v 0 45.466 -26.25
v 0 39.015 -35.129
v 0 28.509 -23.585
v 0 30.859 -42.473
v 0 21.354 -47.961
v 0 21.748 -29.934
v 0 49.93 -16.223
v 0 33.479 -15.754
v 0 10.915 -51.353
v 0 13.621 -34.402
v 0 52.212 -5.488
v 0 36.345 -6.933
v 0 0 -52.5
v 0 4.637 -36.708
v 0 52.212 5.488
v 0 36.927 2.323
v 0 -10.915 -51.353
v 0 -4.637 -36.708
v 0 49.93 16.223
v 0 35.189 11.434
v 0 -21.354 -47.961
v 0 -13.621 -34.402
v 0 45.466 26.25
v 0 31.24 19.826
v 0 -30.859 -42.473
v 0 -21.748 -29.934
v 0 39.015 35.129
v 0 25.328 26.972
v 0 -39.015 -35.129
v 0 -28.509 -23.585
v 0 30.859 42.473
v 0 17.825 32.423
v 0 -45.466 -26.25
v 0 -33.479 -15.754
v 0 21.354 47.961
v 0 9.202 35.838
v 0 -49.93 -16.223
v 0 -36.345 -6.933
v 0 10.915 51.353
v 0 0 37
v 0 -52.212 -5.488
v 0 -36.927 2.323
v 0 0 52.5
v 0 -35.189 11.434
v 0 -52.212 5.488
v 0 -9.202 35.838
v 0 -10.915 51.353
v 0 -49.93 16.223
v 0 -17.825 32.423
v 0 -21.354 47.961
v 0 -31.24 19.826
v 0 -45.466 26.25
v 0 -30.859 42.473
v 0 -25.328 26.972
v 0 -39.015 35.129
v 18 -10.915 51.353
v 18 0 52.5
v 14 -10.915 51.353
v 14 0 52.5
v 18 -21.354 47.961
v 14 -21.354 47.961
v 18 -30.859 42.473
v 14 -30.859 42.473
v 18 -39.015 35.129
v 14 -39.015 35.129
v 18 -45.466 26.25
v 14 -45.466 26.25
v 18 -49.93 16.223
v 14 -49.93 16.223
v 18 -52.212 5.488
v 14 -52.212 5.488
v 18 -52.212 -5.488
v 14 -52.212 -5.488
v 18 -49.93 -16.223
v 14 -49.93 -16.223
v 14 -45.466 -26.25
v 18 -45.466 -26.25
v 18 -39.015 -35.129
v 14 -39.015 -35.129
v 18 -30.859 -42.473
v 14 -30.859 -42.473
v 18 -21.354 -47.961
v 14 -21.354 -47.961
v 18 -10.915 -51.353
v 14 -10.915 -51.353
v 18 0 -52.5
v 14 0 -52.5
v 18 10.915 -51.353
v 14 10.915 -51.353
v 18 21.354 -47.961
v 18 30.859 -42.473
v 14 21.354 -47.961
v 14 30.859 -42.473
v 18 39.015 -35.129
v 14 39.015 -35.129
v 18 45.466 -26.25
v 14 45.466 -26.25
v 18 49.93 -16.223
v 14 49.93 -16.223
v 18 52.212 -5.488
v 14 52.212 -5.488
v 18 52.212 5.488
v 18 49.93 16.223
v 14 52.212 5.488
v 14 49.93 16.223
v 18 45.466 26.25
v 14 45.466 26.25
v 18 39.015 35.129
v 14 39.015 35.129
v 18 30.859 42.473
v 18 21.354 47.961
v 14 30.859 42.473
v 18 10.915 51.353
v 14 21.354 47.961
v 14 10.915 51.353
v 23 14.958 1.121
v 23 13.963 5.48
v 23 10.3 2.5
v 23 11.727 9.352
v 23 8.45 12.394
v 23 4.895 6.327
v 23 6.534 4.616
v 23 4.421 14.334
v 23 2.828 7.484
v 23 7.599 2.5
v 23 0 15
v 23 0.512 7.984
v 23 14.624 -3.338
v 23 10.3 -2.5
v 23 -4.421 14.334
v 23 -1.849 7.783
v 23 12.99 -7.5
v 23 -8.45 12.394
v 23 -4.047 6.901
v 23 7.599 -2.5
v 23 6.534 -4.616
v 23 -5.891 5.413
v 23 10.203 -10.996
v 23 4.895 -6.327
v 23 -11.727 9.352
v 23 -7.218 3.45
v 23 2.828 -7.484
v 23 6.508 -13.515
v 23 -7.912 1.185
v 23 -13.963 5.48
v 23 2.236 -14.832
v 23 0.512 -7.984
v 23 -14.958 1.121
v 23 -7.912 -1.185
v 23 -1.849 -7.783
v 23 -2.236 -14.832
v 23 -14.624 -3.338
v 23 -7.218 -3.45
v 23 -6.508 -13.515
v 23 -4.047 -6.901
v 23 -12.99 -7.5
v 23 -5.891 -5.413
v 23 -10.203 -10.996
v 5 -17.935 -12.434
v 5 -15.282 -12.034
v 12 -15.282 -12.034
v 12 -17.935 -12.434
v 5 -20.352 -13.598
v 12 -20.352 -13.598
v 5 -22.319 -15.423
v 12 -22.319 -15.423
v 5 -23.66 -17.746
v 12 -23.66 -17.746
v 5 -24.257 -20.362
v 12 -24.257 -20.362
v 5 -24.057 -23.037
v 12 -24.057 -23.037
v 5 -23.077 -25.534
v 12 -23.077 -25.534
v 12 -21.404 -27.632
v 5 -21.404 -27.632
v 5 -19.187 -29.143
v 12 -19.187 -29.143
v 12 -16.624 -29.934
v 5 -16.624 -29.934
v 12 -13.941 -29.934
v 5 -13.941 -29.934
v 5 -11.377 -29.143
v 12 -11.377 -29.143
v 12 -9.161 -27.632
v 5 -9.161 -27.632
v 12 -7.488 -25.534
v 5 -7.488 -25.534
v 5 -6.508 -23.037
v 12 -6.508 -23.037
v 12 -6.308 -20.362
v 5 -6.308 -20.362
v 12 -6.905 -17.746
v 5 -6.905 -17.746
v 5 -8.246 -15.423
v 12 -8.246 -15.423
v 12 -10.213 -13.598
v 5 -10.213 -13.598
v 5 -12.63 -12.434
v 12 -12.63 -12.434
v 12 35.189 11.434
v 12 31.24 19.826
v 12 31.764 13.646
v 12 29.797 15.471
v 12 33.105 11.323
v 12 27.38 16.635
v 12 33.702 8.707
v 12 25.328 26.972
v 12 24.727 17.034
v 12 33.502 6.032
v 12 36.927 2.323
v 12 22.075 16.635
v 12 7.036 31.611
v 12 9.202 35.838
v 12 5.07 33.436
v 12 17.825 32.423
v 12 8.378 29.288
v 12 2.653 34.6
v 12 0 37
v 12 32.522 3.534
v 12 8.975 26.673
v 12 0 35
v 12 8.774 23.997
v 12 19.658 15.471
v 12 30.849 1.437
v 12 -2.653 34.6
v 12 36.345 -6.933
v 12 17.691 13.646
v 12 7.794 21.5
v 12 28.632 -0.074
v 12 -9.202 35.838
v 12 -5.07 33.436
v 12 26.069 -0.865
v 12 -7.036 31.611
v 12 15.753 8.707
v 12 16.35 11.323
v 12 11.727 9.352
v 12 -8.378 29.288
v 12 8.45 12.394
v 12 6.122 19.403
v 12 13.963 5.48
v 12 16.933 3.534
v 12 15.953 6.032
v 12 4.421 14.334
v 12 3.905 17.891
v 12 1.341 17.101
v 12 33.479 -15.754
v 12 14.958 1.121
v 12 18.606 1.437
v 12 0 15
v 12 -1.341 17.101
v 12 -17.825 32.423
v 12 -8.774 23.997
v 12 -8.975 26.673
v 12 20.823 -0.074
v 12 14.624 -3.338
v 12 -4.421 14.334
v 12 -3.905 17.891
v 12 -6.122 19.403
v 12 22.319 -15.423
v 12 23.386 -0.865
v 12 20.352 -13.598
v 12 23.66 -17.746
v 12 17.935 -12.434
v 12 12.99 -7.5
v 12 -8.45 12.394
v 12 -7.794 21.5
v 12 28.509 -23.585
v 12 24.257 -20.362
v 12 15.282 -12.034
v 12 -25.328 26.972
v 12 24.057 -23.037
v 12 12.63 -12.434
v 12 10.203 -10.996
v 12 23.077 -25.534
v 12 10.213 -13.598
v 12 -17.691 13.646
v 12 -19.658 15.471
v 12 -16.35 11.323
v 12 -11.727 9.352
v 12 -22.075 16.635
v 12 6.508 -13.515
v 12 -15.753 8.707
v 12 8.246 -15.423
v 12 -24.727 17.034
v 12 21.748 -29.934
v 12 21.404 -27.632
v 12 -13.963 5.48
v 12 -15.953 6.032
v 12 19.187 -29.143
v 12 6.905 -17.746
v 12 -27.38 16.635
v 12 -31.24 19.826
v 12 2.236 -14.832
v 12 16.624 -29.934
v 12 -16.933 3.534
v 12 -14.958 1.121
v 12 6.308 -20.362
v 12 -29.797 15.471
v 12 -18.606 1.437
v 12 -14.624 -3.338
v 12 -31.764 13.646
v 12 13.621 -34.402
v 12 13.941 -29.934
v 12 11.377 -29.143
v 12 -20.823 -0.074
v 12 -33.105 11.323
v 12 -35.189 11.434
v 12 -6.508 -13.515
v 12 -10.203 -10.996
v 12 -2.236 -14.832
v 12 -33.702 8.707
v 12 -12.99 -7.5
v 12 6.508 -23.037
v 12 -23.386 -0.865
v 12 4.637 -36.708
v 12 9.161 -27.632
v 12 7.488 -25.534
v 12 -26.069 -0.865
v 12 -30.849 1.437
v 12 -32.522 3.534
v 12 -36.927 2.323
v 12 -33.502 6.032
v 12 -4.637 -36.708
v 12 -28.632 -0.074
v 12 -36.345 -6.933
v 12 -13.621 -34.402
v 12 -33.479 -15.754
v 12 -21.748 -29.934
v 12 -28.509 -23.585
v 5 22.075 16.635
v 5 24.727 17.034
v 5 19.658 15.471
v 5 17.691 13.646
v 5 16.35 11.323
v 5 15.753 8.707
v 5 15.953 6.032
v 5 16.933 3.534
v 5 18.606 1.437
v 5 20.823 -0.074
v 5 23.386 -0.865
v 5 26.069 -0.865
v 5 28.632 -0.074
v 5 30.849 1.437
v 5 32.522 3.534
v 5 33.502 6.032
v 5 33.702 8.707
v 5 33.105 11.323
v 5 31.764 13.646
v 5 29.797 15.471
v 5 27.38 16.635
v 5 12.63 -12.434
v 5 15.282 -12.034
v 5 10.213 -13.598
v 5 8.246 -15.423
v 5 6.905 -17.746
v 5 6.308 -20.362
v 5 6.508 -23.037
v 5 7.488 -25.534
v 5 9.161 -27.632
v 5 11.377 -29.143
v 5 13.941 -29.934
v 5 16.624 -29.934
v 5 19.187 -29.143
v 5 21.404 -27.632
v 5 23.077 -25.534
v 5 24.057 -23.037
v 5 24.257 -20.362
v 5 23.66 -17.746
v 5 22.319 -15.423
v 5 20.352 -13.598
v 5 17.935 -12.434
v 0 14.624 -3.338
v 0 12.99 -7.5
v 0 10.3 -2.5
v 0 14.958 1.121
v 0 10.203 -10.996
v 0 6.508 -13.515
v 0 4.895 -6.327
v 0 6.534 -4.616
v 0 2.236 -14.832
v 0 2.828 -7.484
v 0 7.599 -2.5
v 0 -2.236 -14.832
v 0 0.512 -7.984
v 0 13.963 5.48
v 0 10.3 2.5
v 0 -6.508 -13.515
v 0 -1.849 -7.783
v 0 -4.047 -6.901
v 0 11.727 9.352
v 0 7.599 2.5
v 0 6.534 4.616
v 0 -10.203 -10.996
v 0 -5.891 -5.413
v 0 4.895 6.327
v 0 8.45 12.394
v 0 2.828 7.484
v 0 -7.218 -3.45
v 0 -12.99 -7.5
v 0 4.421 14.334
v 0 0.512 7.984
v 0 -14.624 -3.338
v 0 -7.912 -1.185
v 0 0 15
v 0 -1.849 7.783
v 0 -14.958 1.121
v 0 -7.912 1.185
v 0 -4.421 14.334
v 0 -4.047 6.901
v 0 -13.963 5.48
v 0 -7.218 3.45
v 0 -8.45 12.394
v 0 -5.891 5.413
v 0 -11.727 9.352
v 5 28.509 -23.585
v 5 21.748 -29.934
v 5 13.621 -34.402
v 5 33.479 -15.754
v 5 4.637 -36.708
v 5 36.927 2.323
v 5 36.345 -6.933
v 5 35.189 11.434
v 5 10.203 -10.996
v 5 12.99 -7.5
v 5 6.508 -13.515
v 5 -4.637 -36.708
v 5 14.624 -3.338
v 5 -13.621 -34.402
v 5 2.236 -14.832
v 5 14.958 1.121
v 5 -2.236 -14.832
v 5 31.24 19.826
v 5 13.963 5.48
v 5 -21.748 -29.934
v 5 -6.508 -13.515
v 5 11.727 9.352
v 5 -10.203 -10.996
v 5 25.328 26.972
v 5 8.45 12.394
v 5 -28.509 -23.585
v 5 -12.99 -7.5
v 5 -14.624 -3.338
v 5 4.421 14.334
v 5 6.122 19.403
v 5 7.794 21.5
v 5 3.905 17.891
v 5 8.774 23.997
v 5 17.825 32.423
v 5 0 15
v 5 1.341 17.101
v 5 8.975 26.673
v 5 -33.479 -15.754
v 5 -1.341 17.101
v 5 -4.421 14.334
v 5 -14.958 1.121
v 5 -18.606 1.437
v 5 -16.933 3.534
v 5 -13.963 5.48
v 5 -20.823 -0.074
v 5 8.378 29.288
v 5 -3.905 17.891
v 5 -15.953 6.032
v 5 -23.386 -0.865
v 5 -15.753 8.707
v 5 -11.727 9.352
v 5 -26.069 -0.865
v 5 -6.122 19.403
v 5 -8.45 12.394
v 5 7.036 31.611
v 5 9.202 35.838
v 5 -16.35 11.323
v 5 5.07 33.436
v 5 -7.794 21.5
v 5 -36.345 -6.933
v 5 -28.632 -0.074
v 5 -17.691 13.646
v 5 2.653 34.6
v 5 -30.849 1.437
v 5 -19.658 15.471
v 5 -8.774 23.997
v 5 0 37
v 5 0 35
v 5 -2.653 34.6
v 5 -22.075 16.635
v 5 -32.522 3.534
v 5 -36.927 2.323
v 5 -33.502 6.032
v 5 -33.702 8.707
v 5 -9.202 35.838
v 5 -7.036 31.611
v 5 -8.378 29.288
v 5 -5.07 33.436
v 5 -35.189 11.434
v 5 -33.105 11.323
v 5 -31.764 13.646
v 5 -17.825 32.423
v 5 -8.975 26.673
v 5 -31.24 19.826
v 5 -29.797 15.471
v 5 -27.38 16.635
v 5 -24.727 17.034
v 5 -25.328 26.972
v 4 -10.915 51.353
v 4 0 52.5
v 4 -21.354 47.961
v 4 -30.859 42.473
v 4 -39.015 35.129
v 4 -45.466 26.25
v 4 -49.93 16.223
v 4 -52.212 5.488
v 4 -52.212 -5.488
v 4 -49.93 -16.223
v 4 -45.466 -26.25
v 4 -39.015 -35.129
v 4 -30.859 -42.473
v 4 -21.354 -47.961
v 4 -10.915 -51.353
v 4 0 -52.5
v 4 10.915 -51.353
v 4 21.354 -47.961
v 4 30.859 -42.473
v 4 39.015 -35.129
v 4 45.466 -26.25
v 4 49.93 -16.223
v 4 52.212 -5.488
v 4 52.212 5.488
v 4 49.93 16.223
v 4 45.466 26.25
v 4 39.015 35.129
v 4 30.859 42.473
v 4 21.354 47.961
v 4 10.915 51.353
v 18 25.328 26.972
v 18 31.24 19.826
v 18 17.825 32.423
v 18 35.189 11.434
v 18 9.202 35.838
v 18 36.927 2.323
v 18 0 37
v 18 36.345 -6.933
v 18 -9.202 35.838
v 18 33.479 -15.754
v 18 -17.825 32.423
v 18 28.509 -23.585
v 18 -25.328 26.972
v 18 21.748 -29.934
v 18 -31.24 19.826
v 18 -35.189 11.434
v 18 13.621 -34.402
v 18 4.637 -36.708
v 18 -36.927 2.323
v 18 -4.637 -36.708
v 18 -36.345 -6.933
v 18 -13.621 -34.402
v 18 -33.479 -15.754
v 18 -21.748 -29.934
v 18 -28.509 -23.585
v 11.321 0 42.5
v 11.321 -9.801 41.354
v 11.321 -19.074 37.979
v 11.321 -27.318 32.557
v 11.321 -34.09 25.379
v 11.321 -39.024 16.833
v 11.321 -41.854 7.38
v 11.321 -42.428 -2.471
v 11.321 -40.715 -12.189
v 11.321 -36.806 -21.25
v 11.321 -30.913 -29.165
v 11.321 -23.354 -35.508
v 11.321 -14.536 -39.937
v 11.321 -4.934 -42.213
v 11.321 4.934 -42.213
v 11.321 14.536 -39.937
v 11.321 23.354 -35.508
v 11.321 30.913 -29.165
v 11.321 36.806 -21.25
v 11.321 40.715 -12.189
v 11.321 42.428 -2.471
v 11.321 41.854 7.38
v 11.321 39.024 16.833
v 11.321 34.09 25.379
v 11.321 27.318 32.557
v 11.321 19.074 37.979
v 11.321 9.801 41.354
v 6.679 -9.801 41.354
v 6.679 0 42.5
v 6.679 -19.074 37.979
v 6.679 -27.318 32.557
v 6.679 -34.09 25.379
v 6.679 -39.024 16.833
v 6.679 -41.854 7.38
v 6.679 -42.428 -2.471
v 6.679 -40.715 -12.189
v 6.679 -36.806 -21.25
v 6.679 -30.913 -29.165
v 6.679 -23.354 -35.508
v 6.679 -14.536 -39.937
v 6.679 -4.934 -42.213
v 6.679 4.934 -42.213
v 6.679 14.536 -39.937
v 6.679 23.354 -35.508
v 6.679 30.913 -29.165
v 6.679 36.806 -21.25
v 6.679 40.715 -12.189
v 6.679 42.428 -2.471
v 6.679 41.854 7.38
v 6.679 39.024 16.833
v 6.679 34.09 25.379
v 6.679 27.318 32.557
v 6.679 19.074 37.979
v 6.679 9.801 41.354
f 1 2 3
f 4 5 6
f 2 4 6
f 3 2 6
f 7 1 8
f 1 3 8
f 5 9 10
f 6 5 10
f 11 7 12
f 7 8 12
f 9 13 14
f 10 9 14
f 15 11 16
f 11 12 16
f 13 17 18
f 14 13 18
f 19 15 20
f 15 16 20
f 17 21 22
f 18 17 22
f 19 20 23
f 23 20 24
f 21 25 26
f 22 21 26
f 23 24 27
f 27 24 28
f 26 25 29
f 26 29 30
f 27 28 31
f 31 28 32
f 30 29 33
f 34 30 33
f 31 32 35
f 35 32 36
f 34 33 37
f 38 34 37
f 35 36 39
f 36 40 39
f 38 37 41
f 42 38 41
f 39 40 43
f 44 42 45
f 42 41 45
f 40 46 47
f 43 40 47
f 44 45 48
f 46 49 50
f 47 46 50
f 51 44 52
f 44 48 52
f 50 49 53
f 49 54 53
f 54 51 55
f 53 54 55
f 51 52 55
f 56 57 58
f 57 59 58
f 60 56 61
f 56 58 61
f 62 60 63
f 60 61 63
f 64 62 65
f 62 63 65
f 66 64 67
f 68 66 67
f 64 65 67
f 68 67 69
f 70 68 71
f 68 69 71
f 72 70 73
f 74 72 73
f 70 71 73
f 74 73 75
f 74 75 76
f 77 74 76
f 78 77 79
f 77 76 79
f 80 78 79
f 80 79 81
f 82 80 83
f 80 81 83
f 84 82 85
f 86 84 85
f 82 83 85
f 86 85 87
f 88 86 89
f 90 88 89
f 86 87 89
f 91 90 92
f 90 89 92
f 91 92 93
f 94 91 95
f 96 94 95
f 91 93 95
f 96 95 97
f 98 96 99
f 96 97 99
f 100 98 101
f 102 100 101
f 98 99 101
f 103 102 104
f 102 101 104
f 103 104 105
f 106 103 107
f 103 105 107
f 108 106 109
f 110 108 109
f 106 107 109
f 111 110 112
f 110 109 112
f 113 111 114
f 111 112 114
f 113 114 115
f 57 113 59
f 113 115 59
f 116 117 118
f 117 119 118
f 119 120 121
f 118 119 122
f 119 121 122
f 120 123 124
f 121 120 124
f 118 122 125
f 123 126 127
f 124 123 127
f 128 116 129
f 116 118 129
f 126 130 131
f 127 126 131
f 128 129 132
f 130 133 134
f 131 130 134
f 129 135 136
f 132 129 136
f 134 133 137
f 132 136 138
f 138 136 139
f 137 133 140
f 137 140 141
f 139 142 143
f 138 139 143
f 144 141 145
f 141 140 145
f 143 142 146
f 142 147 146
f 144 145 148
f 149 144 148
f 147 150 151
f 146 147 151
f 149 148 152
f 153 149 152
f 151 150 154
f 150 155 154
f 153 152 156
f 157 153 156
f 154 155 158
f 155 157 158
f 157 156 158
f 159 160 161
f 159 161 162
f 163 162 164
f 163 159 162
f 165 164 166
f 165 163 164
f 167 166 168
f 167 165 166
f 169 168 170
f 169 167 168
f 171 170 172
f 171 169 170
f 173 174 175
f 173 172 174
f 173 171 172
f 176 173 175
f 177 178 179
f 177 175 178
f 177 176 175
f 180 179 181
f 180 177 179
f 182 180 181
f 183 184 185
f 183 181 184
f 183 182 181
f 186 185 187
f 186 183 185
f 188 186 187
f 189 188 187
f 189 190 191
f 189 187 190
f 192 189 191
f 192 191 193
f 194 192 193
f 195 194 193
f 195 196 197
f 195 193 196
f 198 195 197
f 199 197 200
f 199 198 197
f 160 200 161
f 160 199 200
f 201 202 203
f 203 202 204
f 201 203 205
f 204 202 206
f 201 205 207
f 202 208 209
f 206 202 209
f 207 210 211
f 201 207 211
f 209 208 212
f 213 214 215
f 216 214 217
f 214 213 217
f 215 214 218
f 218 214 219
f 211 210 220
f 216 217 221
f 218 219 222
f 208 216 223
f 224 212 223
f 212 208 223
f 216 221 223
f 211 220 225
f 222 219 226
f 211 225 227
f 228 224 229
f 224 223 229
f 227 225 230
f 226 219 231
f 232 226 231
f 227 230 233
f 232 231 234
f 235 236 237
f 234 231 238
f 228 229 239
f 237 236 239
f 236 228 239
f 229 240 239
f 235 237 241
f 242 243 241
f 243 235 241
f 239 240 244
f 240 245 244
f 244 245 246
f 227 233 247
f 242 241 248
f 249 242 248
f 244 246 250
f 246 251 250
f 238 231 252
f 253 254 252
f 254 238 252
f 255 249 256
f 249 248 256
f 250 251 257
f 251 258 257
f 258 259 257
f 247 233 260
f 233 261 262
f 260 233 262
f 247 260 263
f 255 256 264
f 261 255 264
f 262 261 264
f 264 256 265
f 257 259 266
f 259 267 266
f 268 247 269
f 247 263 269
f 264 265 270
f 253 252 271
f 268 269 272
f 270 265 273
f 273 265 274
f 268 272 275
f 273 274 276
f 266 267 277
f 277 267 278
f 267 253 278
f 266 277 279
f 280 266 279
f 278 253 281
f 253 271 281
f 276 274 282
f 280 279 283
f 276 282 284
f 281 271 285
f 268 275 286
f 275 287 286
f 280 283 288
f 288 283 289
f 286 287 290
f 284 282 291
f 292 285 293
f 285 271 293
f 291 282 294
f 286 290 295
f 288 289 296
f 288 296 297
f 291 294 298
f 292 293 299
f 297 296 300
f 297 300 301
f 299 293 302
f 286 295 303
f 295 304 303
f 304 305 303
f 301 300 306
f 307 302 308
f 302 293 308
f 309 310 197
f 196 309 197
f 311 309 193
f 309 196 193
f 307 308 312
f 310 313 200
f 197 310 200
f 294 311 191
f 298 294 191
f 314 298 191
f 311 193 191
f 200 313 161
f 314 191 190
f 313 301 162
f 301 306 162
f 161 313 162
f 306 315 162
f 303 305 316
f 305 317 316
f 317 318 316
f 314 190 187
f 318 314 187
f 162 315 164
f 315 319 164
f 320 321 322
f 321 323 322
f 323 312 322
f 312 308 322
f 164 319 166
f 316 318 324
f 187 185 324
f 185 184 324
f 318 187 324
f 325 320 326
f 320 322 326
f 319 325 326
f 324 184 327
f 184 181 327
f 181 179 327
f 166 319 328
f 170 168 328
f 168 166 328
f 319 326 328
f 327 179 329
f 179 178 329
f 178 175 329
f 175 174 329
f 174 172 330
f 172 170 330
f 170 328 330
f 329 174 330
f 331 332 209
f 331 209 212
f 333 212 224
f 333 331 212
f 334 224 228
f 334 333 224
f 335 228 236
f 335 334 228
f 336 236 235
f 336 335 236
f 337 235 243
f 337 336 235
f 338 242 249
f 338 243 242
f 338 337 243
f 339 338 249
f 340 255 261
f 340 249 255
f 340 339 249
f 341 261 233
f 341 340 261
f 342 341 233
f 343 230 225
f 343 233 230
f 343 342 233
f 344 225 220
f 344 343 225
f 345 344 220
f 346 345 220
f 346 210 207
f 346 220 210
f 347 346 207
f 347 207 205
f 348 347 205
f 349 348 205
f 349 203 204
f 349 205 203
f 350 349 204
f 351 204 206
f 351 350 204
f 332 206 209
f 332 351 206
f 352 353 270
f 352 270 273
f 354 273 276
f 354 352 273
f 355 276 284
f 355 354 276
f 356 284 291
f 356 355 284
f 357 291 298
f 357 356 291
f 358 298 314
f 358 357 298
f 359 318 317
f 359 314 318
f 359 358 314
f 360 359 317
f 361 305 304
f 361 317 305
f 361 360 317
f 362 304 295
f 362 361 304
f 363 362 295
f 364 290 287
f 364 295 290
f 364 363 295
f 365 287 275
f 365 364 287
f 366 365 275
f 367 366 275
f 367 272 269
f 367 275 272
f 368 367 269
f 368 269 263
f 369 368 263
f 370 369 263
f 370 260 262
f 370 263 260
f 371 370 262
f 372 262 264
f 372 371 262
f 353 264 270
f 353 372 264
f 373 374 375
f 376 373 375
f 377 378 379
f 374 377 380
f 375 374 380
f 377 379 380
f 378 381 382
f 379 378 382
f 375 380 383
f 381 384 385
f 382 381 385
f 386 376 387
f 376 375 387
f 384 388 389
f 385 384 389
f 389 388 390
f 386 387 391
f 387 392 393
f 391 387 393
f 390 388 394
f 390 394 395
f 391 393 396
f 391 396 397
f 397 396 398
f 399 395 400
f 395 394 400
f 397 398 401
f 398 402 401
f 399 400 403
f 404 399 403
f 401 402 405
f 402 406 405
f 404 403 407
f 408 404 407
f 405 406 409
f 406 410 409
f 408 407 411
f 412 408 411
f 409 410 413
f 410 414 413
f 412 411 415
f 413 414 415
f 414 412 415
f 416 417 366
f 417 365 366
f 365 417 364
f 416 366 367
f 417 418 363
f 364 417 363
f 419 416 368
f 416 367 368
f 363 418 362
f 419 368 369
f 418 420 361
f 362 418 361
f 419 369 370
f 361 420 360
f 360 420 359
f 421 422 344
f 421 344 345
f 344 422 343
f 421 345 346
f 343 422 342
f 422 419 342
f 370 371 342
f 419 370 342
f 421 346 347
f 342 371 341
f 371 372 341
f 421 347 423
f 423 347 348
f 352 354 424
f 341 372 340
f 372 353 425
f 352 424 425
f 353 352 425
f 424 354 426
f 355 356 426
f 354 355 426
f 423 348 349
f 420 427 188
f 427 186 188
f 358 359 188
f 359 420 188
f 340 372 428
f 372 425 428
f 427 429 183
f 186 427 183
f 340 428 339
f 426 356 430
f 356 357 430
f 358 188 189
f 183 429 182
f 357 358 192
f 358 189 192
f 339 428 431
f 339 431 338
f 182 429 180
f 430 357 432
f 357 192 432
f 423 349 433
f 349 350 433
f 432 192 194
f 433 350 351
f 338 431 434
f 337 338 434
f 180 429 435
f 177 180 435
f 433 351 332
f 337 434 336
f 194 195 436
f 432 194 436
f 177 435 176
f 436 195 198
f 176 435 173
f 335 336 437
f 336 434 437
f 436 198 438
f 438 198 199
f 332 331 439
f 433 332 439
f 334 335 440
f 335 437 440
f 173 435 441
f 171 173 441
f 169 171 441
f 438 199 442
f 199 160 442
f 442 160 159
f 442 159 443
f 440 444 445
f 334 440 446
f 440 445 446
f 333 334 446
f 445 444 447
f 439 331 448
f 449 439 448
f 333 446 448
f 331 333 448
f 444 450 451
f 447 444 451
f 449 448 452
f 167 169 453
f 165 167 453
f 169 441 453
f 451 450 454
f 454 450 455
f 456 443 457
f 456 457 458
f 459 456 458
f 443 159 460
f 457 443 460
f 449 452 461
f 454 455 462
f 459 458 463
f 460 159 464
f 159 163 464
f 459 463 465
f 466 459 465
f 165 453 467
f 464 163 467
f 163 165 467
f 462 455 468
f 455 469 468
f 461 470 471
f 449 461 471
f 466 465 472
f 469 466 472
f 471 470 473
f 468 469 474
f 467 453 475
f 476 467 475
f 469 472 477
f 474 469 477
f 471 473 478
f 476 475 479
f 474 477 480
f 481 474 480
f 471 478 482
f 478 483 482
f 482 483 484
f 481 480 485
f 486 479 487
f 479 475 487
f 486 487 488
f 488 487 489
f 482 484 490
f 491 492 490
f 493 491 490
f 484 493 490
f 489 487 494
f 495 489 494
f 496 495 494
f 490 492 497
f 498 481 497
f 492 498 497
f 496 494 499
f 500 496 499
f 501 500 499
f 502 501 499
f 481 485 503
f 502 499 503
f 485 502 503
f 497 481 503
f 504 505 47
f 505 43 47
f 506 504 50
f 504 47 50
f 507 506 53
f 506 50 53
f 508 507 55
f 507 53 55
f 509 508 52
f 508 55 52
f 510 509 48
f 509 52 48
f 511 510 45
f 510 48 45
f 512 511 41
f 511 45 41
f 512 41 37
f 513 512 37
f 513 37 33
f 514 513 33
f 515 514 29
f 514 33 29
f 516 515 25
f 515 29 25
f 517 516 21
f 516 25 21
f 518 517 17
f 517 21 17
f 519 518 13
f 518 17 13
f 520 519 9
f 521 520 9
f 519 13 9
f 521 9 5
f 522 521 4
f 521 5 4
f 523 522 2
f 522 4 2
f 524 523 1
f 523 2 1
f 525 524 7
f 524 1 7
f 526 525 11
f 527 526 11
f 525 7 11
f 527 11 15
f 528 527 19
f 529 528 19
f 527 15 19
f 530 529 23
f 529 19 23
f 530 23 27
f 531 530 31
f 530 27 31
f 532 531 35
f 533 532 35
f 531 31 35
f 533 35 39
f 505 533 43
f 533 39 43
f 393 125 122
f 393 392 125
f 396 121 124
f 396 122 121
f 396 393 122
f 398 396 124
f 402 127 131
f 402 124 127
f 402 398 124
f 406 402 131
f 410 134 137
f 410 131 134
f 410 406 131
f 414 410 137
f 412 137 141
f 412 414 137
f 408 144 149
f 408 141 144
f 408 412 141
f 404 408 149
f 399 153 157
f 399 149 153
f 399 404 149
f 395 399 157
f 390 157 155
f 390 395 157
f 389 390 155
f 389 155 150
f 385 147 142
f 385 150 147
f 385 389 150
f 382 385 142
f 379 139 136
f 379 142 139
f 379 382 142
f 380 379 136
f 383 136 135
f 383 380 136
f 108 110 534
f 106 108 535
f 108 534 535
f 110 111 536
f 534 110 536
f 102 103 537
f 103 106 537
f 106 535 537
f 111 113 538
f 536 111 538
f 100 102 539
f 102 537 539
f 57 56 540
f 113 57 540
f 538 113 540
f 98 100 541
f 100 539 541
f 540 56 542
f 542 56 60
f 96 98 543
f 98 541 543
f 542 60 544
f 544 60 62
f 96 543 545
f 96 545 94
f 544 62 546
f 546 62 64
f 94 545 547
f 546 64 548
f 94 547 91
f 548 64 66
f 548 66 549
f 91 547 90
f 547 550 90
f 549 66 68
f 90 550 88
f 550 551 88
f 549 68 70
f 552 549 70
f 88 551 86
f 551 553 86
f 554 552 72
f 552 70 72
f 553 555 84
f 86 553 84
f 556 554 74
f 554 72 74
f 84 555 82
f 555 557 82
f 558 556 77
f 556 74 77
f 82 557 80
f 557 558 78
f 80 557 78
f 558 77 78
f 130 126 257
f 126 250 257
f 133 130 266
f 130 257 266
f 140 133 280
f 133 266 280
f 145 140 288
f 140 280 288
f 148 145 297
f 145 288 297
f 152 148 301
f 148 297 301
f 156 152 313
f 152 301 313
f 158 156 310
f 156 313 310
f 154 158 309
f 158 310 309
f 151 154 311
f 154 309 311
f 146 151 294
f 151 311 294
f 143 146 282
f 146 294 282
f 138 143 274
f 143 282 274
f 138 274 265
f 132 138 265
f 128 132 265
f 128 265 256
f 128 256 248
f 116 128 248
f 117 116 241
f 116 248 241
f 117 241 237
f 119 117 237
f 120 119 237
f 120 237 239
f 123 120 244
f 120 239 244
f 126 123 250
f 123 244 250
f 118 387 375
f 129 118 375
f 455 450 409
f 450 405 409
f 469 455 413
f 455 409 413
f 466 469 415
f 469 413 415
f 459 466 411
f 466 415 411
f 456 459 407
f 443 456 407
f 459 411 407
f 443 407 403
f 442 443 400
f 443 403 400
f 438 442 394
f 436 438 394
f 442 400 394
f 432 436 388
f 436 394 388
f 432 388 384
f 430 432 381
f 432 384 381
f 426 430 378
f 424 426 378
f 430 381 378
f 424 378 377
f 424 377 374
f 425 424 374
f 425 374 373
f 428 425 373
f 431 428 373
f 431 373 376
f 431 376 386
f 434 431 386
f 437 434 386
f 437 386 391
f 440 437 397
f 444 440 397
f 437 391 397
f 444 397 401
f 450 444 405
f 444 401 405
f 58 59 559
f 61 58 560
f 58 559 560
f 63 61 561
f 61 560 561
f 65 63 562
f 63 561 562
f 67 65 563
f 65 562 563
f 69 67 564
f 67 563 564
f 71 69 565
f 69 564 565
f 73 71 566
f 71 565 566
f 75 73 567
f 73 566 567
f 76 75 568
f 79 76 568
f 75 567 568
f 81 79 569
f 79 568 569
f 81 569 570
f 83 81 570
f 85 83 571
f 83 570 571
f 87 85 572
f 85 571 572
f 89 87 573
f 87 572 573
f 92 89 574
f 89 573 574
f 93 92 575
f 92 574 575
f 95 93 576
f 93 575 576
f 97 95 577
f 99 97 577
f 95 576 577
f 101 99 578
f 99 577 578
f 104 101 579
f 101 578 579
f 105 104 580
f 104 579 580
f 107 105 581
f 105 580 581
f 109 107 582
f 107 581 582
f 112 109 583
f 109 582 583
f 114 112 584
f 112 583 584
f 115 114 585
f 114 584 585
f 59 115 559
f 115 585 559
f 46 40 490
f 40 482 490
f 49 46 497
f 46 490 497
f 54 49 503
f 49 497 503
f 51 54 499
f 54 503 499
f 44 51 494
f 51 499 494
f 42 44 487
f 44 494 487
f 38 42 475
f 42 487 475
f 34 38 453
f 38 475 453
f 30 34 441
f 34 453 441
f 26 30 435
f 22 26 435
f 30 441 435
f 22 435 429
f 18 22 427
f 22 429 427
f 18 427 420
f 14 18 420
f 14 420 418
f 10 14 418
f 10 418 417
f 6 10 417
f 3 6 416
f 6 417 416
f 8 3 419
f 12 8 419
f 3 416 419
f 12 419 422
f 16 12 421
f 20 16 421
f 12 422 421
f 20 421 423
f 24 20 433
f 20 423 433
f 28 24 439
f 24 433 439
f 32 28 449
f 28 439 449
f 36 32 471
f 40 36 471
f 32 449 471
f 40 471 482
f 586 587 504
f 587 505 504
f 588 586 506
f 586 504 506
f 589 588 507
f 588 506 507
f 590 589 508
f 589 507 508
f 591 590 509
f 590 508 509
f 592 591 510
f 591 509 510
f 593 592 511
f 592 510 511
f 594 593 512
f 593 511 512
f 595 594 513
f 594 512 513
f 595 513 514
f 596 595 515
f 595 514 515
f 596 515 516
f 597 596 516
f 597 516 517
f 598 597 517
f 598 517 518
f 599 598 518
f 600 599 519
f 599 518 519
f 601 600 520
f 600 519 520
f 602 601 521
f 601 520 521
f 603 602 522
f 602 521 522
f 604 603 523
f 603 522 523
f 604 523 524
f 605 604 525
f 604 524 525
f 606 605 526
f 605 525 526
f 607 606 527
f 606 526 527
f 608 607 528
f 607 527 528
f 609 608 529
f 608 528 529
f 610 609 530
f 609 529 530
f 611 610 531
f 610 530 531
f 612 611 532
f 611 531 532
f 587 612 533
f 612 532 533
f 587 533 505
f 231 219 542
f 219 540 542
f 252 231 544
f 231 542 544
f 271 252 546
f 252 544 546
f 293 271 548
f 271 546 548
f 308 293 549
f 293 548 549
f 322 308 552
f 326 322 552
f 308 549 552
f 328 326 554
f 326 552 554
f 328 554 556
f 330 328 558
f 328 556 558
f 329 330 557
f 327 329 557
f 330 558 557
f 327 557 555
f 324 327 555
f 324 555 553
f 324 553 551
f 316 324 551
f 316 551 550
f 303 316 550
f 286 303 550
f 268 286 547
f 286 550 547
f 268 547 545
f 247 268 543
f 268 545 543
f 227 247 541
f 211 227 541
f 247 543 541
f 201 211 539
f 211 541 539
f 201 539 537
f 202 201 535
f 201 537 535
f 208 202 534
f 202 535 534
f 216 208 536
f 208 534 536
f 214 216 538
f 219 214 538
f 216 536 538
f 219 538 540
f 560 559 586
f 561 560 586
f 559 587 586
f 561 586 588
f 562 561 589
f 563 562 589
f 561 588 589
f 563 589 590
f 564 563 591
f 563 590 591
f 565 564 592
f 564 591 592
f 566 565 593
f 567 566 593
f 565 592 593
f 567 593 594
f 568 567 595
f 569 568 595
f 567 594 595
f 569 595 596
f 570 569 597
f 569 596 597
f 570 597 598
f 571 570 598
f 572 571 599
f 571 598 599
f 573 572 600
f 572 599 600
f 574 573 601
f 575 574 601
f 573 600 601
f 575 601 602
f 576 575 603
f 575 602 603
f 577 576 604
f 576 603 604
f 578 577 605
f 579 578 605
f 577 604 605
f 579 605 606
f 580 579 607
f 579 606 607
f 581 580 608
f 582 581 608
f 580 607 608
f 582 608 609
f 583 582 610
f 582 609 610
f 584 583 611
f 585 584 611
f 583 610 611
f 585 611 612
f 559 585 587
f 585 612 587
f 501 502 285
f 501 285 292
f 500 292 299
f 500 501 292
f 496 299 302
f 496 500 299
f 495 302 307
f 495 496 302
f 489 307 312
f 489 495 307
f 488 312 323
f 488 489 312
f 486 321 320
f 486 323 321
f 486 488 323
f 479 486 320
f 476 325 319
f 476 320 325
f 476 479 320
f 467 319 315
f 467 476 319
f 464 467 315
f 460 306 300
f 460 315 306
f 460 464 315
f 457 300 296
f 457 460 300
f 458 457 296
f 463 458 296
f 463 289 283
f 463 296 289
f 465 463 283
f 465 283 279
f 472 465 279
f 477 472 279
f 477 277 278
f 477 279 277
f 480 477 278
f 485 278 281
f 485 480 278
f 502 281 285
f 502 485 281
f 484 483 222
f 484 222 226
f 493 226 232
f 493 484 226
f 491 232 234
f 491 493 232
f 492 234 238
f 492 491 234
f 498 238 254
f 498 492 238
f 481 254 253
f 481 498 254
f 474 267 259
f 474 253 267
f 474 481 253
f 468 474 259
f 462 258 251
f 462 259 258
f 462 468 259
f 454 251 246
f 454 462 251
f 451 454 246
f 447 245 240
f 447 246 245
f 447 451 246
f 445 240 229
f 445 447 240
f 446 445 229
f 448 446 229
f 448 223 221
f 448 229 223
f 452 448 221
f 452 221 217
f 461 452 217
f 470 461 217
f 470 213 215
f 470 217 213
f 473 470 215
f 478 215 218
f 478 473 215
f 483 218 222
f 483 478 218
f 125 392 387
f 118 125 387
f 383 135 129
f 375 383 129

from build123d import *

# Parameters (mm, degrees)
SKETCH_2_R        = 8
F_02_BORE_DEPTH   = 25
SKETCH_3_W        = 5
SKETCH_3_H        = 3.3
F_03_KEYWAY_DEPTH = 25
SKETCH_4_R        = 9
F_04_HOLE_0_DEPTH = 9
SKETCH_5_R        = 9
F_04_HOLE_1_DEPTH = 9
SKETCH_6_R        = 9
F_04_HOLE_2_DEPTH = 9
SKETCH_7_R        = 9
F_04_HOLE_3_DEPTH = 9
SKETCH_8_R        = 9
F_04_HOLE_4_DEPTH = 9


with BuildPart() as part:
    # 草图1 → 01_BODY (revolve)
    with BuildSketch(Plane.XY, mode=Mode.PRIVATE) as f_01_body_sk:
        Polygon((0, 0), (23, 0), (23, 15), (12, 15), (12, 37), (18, 37), (18, 52.5), (14, 52.5), (11.320508076, 42.5), (6.679491924, 42.5), (4, 52.5), (0, 52.5), (0, 37), (5, 37), (5, 15), (0, 15), align=None)
    revolve(f_01_body_sk.sketch.rotate(Axis((-5, 0, 0), (1, 0, 0)), 90), axis=Axis((-5, 0, 0), (1, 0, 0)))

    # 草图2 → 02_BORE (cut)
    with BuildSketch(Plane(origin=(-1, 0, 0), x_dir=(0, 0, -1), z_dir=(1, 0, 0))):
        with Locations(Location((0, 0, 0), (0, 0, 180))):
            Circle(SKETCH_2_R)
    extrude(amount=F_02_BORE_DEPTH, mode=Mode.SUBTRACT)

    # 草图3 → 03_KEYWAY (cut)
    with BuildSketch(Plane(origin=(-1, 0, 0), x_dir=(0, 0, -1), z_dir=(1, 0, 0))):
        with Locations((0, 8.65)):
            Rectangle(SKETCH_3_W, SKETCH_3_H)
    extrude(amount=F_03_KEYWAY_DEPTH, mode=Mode.SUBTRACT)

    # 草图4 → 04_HOLE_0 (cut)
    with BuildSketch(Plane(origin=(4, 0, 0), x_dir=(0, 0, -1), z_dir=(1, 0, 0))):
        with Locations(Location((-26, 0, 0), (0, 0, 180))):
            Circle(SKETCH_4_R)
    extrude(amount=F_04_HOLE_0_DEPTH, mode=Mode.SUBTRACT)

    # 草图5 → 04_HOLE_1 (cut)
    with BuildSketch(Plane(origin=(4, 0, 0), x_dir=(0, 0, -1), z_dir=(1, 0, 0))):
        with Locations(Location((-8.034441854, -24.727469424, 0), (0, 0, 180))):
            Circle(SKETCH_5_R)
    extrude(amount=F_04_HOLE_1_DEPTH, mode=Mode.SUBTRACT)

    # 草图6 → 04_HOLE_2 (cut)
    with BuildSketch(Plane(origin=(4, 0, 0), x_dir=(0, 0, -1), z_dir=(1, 0, 0))):
        with Locations(Location((21.034441854, -15.28241656, 0), (0, 0, 180))):
            Circle(SKETCH_6_R)
    extrude(amount=F_04_HOLE_2_DEPTH, mode=Mode.SUBTRACT)

    # 草图7 → 04_HOLE_3 (cut)
    with BuildSketch(Plane(origin=(4, 0, 0), x_dir=(0, 0, -1), z_dir=(1, 0, 0))):
        with Locations(Location((21.034441854, 15.28241656, 0), (0, 0, 180))):
            Circle(SKETCH_7_R)
    extrude(amount=F_04_HOLE_3_DEPTH, mode=Mode.SUBTRACT)

    # 草图8 → 04_HOLE_4 (cut)
    with BuildSketch(Plane(origin=(4, 0, 0), x_dir=(0, 0, -1), z_dir=(1, 0, 0))):
        with Locations(Location((-8.034441854, 24.727469424, 0), (0, 0, 180))):
            Circle(SKETCH_8_R)
    extrude(amount=F_04_HOLE_4_DEPTH, mode=Mode.SUBTRACT)


solid = part.part
